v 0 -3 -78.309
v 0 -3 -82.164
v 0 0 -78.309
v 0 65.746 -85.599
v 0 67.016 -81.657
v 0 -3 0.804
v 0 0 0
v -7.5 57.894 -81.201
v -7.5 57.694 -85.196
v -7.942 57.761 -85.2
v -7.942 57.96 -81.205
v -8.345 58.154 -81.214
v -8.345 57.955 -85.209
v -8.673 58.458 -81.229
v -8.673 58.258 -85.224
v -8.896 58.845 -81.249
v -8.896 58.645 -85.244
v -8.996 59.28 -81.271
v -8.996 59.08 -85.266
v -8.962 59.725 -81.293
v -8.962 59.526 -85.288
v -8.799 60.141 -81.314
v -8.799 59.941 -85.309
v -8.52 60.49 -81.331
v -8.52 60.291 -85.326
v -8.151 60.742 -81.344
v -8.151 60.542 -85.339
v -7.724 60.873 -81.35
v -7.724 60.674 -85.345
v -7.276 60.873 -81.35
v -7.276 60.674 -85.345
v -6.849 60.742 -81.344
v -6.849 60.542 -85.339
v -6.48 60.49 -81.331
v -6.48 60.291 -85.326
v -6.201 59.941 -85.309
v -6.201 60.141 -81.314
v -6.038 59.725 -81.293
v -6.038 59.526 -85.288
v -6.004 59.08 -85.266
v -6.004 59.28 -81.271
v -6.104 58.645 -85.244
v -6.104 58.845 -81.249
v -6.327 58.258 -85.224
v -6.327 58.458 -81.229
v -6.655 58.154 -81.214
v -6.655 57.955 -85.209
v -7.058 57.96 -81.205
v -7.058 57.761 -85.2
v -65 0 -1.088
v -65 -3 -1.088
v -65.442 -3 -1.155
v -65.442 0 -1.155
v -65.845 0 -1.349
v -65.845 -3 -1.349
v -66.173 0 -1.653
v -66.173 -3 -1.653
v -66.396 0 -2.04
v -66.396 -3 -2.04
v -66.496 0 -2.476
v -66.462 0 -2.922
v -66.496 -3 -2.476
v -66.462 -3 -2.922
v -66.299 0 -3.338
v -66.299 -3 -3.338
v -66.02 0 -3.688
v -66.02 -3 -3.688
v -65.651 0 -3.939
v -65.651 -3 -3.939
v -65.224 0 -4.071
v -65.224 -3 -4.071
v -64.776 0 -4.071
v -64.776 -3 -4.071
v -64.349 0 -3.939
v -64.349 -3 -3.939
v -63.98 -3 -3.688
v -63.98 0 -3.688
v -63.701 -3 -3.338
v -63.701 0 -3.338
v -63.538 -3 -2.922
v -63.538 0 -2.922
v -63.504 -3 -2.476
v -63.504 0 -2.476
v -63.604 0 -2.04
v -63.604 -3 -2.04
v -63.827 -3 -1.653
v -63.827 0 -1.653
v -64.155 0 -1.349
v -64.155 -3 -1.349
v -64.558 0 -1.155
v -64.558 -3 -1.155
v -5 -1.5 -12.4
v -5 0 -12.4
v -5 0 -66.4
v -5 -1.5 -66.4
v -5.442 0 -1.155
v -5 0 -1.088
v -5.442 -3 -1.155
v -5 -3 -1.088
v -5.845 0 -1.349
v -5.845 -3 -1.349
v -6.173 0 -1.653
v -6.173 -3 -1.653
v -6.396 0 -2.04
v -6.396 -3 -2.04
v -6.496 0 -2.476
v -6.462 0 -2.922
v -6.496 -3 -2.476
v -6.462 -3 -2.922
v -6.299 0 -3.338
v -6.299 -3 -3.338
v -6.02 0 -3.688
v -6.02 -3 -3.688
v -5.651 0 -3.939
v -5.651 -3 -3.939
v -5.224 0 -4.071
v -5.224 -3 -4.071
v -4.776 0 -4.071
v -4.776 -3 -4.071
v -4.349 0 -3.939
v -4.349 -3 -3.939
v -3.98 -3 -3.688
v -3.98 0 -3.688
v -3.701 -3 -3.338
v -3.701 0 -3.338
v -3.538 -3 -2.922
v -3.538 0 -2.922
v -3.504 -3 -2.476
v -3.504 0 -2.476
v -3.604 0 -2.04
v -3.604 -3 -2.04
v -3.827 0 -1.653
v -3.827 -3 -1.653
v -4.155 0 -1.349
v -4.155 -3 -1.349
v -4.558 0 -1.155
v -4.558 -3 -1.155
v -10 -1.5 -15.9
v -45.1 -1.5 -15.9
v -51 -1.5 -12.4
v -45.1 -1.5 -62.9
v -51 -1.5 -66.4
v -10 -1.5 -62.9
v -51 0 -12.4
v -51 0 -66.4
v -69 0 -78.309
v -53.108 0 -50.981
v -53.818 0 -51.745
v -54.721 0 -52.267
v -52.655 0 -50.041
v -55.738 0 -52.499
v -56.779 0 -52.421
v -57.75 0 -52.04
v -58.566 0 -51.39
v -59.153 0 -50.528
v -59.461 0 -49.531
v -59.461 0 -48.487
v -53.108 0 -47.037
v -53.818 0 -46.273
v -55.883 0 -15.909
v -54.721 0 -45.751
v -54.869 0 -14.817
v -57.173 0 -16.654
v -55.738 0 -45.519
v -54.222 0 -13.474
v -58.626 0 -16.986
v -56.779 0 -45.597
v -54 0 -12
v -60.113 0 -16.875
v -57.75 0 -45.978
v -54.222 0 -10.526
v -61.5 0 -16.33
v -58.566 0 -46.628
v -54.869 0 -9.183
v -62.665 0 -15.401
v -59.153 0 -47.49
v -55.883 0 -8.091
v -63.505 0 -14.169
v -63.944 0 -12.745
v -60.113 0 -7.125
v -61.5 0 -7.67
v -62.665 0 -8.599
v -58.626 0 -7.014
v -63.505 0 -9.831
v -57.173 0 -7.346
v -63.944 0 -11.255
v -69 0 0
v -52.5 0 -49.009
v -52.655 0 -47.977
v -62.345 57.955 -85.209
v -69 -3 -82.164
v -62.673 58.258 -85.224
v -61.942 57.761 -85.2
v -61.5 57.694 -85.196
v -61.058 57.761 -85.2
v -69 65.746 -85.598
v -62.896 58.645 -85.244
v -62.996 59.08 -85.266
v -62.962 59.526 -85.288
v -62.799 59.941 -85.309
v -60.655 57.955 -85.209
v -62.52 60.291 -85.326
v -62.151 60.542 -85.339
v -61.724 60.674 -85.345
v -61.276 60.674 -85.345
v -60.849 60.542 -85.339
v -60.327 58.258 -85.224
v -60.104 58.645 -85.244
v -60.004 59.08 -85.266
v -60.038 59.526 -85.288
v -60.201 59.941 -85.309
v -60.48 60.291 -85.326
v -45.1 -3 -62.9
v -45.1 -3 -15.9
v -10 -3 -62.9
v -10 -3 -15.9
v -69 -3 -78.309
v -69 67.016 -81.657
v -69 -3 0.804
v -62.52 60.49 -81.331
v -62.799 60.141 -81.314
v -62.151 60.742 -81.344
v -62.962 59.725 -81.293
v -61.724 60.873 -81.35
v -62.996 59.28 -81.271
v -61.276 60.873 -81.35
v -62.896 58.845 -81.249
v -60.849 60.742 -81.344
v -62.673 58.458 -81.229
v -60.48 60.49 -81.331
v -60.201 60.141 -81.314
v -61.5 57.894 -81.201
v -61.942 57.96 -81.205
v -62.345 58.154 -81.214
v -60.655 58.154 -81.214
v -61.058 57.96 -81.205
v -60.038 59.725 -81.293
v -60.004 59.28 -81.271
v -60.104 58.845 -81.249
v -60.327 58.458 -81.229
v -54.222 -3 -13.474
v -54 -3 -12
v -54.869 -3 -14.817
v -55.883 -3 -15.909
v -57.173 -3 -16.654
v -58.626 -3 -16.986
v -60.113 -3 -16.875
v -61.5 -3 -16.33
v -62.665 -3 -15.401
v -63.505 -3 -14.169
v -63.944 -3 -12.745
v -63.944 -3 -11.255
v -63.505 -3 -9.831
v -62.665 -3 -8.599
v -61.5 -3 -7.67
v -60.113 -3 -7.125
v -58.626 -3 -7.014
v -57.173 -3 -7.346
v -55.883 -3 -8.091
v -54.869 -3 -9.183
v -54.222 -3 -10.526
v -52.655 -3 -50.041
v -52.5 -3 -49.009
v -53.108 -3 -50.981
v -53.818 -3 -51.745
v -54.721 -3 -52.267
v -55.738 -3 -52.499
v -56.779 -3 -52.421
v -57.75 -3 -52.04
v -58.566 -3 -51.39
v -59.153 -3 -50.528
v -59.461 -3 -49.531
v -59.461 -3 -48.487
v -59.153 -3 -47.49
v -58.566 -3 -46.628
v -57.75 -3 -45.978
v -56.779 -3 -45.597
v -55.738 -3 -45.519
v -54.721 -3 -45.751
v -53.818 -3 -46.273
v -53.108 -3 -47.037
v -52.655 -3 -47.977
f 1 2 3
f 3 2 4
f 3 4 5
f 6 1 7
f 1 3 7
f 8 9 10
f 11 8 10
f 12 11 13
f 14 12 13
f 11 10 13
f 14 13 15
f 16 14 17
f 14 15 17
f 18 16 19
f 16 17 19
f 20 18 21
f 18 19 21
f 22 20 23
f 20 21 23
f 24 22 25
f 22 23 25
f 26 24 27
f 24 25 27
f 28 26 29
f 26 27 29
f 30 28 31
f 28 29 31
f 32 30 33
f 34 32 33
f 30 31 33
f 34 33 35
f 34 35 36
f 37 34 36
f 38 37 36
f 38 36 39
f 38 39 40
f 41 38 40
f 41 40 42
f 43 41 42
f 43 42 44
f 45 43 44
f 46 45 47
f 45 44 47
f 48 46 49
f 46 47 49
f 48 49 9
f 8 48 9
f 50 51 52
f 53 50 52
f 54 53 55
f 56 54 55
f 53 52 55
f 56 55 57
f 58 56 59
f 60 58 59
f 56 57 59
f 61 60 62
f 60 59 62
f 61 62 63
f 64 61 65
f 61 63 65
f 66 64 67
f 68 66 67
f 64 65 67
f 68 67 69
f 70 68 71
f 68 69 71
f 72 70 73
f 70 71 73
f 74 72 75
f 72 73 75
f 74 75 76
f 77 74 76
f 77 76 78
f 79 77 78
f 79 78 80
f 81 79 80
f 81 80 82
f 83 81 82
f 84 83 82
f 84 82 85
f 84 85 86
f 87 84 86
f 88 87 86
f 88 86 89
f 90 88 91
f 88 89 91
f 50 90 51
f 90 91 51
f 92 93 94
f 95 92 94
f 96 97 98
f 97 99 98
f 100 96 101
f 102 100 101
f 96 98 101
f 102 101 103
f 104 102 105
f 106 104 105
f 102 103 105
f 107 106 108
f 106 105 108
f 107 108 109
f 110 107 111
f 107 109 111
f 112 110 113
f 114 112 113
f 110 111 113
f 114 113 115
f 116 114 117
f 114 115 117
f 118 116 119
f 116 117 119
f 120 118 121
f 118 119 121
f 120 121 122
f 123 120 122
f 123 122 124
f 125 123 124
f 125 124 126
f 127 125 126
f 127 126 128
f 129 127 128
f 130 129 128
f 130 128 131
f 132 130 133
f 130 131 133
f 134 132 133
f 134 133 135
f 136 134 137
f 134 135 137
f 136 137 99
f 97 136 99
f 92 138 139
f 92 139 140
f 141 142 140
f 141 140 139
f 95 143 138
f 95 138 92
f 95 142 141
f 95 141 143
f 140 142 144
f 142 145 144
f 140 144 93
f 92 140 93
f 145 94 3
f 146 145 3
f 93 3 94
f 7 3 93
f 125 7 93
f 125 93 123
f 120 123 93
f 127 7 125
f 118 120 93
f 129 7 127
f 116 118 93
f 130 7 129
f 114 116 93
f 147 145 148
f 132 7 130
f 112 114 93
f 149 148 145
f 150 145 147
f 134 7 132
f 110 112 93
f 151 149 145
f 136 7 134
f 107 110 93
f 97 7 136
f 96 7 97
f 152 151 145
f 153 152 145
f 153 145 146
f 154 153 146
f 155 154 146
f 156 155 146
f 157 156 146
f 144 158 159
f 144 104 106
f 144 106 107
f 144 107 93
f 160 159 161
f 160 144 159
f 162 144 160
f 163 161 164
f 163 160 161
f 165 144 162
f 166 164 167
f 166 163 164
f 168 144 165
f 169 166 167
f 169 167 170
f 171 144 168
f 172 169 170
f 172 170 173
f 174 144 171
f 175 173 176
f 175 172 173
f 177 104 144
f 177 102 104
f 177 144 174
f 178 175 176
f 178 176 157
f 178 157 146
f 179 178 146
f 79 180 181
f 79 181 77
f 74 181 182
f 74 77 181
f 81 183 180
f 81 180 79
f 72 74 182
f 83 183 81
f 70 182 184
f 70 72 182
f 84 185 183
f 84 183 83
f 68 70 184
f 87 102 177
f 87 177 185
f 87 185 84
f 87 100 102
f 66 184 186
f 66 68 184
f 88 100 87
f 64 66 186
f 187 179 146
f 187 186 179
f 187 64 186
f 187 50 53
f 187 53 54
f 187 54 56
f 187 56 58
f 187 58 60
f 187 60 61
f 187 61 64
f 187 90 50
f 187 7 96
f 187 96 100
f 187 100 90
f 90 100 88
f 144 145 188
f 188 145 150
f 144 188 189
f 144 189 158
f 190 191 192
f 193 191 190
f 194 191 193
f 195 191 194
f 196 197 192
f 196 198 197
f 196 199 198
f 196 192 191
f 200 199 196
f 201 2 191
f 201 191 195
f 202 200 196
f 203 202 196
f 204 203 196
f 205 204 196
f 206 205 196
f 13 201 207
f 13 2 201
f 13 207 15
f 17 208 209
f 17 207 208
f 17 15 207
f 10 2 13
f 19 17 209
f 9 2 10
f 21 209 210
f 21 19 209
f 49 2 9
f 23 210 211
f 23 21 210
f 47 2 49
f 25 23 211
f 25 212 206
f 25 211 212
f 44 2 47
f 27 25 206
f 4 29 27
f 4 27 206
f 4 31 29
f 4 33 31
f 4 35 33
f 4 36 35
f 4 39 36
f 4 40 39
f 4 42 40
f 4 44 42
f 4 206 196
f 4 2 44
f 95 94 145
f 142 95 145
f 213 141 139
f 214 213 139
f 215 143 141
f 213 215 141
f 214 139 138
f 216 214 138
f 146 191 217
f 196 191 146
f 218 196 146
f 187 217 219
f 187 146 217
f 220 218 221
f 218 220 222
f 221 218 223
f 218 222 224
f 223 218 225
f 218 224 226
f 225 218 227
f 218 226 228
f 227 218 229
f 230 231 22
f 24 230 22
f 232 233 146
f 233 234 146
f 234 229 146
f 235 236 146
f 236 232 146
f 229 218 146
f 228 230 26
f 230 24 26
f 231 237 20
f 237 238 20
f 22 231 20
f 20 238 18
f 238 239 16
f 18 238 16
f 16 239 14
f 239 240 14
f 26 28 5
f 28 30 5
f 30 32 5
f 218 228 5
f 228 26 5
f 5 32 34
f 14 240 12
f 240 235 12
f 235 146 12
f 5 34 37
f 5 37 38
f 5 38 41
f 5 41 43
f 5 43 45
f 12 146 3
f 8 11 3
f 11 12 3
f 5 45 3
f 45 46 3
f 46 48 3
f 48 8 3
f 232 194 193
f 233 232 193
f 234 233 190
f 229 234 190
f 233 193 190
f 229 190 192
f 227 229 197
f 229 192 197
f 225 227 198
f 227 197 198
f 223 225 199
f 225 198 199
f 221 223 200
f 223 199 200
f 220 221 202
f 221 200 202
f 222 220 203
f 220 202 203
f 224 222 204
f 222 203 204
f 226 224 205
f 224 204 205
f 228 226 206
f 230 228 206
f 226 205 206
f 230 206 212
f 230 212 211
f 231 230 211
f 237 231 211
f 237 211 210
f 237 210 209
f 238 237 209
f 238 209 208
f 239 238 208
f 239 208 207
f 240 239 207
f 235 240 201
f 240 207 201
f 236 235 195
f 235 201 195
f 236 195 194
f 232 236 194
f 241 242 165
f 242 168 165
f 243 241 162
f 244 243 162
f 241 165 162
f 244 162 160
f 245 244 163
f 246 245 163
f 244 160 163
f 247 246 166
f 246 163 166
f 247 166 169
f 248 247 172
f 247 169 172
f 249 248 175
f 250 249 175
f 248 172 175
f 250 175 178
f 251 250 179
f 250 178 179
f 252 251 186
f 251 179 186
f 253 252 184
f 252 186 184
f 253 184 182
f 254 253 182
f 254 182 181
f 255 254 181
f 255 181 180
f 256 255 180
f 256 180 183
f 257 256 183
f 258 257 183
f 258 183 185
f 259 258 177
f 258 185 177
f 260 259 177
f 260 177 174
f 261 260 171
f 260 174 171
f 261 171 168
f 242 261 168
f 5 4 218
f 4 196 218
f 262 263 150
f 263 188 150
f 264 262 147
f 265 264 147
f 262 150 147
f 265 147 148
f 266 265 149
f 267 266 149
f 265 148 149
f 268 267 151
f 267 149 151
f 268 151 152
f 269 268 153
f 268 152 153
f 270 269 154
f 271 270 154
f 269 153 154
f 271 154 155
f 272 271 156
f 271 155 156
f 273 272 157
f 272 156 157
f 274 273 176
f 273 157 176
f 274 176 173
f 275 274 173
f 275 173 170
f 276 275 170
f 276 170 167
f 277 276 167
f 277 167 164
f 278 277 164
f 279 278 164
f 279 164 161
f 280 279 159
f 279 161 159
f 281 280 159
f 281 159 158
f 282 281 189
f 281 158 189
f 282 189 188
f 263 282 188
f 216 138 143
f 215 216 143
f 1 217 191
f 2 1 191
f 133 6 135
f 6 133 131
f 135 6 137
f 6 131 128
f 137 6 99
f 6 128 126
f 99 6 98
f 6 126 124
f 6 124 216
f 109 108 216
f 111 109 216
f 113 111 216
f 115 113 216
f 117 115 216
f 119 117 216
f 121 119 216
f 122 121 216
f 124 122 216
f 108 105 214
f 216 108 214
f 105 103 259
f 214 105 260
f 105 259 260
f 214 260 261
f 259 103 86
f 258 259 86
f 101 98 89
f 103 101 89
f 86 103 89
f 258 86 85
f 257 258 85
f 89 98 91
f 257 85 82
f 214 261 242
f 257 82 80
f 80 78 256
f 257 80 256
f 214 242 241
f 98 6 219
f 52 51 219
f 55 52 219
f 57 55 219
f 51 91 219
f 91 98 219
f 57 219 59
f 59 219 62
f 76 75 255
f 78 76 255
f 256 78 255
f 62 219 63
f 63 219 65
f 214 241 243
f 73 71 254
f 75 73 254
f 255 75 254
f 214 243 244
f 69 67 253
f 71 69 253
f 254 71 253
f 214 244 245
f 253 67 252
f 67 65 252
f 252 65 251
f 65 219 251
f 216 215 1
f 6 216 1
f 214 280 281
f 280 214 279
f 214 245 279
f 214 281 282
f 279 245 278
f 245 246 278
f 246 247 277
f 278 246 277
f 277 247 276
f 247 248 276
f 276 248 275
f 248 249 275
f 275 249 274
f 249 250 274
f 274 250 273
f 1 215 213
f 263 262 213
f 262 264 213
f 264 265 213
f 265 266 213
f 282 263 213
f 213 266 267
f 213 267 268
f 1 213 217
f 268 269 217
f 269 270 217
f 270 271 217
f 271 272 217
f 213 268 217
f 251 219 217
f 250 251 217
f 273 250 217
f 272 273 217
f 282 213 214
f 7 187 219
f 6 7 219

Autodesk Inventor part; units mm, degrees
ref_plane "YZ Plane" through (0, 0, 0) normal (1, 0, 0) x (0, 1, 0)
ref_plane "XZ Plane" through (0, 0, 0) normal (0, 1, 0) x (-1, 0, 0)
sketch "Skizze1" plane through (0, 0, 0) normal (0, 1, 0) x (-1, 0, 0)
  line L0 (0, 0) -> (69, 0)
  line L1 (69, 0) -> (69, -78.309)
  line L2 (69, -78.309) -> (0, -78.309)
  line L3 (0, -78.309) -> (0, 0)
  dimension "d0" = 69
  dimension "d1" = 78.309
extrude "Extrusion1" add sketch "Skizze1" against normal blind 3
ref_plane "Arbeitsebene1" through (-69, 0, -78.309) normal (0, -0.0498957, -0.9987544) x (1, 0, 0)
sketch "Skizze2" plane through (-69, 0, -78.309) normal (0, -0.0498957, -0.9987544) x (1, 0, 0)
  line L0 (0, 0) -> (69, 0) projected
  line L1 (69, 0) -> (69, 2.9963) projected
  line L2 (0, 2.9963) -> (69, 2.9963) projected
  line L3 (0, 0) -> (0, 2.9963) projected
  line L4 (69, 0) -> (0, 0)
  line L5 (0, 0) -> (0, -67.1)
  line L6 (0, -67.1) -> (69, -67.1)
  line L7 (69, -67.1) -> (69, 0)
  point P0 (69, 3.9073)
  dimension "d5" = 69
  dimension "d6" = 67.1
extrude "Extrusion2" add sketch "Skizze2" along normal blind 4 contours L0 L7 L6 L5
sketch "Skizze4" plane through (-69, 0, -78.309) normal (0, 0.0498957, 0.9987544) x (1, 0, 0)
  line L0 (0, 0) -> (0, 67.1) projected
  line L1 (0, 67.1) -> (69, 67.1) projected
  line L2 (69, 67.1) -> (69, 0) projected
  line L3 (0, 0) -> (69, 0) projected
  line L4 (69, 67.1) -> (69, 0) projected
  line L5 (0, 67.1) -> (69, 67.1) projected
  line L6 (0, 0) -> (0, 67.1) projected
  line L7 (69, 0) -> (0, 0) projected
  point P0 (69, -3.9073)
  point P1 (61.5, 59.466)
  point P2 (7.5, 59.466)
  dimension "d12" = 7.634
  dimension "d14" = 7.5
  dimension "d15" = 7.634
  dimension "d16" = 7.5
hole "Bohrung1" at (-7.5, 59.3919, -81.2761) at (-61.5, 59.3919, -81.2761) direction (0, -0.0498957, -0.9987544) diameter 3 depth 8 tip angle 118
sketch "Skizze5" plane through (0, 0, 0) normal (0, 1, 0) x (1, 0, 0)
  line L0 (0, 0) -> (-69, 0) projected
  line L1 (0, 78.309) -> (0, 0) projected
  line L2 (-69, 78.309) -> (0, 78.309) projected
  line L3 (-69, 0) -> (-69, 78.309) projected
  line L4 (-10, 62.9) -> (-45.1, 62.9)
  line L5 (-45.1, 62.9) -> (-45.1, 15.9)
  line L6 (-45.1, 15.9) -> (-10, 15.9)
  line L7 (-10, 15.9) -> (-10, 62.9)
  line L8 (-5, 66.4) -> (-51, 66.4)
  line L9 (-51, 66.4) -> (-51, 12.4)
  line L10 (-51, 12.4) -> (-5, 12.4)
  line L11 (-5, 12.4) -> (-5, 66.4)
  circle A0 centre (-59, 12) radius 5
  circle A1 centre (-56, 49.009) radius 3.5
  point P0 (-5, 2.588)
  point P1 (-65, 2.588)
  dimension "d24" = 35.1
  dimension "d25" = 47
  dimension "d26" = 54
  dimension "d27" = 46
  dimension "d28" = 5
  dimension "d29" = 3.5
  dimension "d30" = 12.4
  dimension "d31" = 5
  dimension "d32" = 7
  dimension "d34" = 13
  dimension "d35" = 10
  dimension "d37" = 10
  dimension "d40" = 5
  dimension "d41" = 2.588
  dimension "d42" = 4
  dimension "d56" = 29.3
  dimension "d57" = 12
extrude "Extrusion4" cut sketch "Skizze5" against normal blind 69 contours L7 L6 L5 L4 | A0 | A1
extrude "Extrusion5" cut sketch "Skizze5" against normal blind 1.5 contours L11 L10 L9 L8
hole "Bohrung2" at (-5, 0, -2.588) at (-65, 0, -2.588) direction (0, -1, 0) diameter 3 depth 8 tip angle 118
sketch "Skizze6" plane through (0, 0, -78.309) normal (1, 0, 0) x (0, -0.0498957, -0.9987544)
  line L0 (0, 0) -> (0.1497, -2.9963) projected
  line L1 (0, 0) -> (-78.2115, -3.9073) projected
  line L2 (-78.2115, -3.9073) -> (-78.0618, -6.9035) projected
  line L3 (0.1497, -2.9963) -> (-78.0618, -6.9035) projected
  line L4 (0, 0) -> (0.1497, -2.9963) projected
  line L5 (0, 67.1) -> (0, 0) projected
  line L6 (0, 0) -> (4, 0) projected
  line L7 (4, 67.1) -> (4, 0) projected
  line L8 (0, 67.1) -> (4, 67.1) projected
  line L9 (4, 0) -> (0, 0)
  line L10 (0, 0) -> (4, 0) projected
  line L11 (0, 0) -> (0.1497, -2.9963)
  line L12 (0.1497, -2.9963) -> (4, -2.8039)
  line L13 (4, -2.8039) -> (4, 0)
  line L14 (0.1497, -2.9963) -> (-78.0618, -6.9035) projected
  point P0 (4, 0)
extrude "Extrusion6" add sketch "Skizze6" against normal blind 69 contours L6 L13 L12 L0
sketch "Skizze7" plane through (-69, -3, 0) normal (-1, 0, 0) x (0, 0, 1)
  line L0 (0, 3) -> (-78.309, 3) projected
  line L1 (-78.309, 3) -> (-81.657, 70.0164) projected
  line L2 (-81.657, 70.0164) -> (-85.652, 69.8168) projected
  line L3 (-85.652, 69.8168) -> (-82.1641, 0) projected
  line L4 (0, 0) -> (-82.1641, 0) projected
  line L5 (0, 3) -> (0, 0) projected
  line L6 (-78.309, 3) -> (-81.657, 70.0164) projected
  line L7 (-85.652, 69.8168) -> (-82.1641, 0) projected
  line L8 (-85.5985, 68.7464) -> (-81.657, 70.0164)
  line L9 (0, 0) -> (0, 3)
  line L10 (0, 0) -> (0, 3)
  line L11 (0, 3) -> (0.8038, 0)
  line L12 (0.8038, 0) -> (0, 0)
  line L13 (0.8038, 0) -> (0, 0)
  line L14 (0, 0) -> (0, 3)
  line L15 (0, 3) -> (0.8038, 3)
  line L16 (0.8038, 3) -> (0.8038, 0)
  line L17 (0, 0) -> (0, 3)
  line L18 (0, 3) -> (0, 0) projected
  point P0 (-0.4568, 4.2362)
  dimension "d59" = 15
  dimension "d62" = 15
extrude "Extrusion7" cut sketch "Skizze7" against normal blind 80 contours L8 L3 L2
extrude "Extrusion8" add sketch "Skizze7" against normal blind 69 contours L11 L12 L5
properties part number "Dekel"
